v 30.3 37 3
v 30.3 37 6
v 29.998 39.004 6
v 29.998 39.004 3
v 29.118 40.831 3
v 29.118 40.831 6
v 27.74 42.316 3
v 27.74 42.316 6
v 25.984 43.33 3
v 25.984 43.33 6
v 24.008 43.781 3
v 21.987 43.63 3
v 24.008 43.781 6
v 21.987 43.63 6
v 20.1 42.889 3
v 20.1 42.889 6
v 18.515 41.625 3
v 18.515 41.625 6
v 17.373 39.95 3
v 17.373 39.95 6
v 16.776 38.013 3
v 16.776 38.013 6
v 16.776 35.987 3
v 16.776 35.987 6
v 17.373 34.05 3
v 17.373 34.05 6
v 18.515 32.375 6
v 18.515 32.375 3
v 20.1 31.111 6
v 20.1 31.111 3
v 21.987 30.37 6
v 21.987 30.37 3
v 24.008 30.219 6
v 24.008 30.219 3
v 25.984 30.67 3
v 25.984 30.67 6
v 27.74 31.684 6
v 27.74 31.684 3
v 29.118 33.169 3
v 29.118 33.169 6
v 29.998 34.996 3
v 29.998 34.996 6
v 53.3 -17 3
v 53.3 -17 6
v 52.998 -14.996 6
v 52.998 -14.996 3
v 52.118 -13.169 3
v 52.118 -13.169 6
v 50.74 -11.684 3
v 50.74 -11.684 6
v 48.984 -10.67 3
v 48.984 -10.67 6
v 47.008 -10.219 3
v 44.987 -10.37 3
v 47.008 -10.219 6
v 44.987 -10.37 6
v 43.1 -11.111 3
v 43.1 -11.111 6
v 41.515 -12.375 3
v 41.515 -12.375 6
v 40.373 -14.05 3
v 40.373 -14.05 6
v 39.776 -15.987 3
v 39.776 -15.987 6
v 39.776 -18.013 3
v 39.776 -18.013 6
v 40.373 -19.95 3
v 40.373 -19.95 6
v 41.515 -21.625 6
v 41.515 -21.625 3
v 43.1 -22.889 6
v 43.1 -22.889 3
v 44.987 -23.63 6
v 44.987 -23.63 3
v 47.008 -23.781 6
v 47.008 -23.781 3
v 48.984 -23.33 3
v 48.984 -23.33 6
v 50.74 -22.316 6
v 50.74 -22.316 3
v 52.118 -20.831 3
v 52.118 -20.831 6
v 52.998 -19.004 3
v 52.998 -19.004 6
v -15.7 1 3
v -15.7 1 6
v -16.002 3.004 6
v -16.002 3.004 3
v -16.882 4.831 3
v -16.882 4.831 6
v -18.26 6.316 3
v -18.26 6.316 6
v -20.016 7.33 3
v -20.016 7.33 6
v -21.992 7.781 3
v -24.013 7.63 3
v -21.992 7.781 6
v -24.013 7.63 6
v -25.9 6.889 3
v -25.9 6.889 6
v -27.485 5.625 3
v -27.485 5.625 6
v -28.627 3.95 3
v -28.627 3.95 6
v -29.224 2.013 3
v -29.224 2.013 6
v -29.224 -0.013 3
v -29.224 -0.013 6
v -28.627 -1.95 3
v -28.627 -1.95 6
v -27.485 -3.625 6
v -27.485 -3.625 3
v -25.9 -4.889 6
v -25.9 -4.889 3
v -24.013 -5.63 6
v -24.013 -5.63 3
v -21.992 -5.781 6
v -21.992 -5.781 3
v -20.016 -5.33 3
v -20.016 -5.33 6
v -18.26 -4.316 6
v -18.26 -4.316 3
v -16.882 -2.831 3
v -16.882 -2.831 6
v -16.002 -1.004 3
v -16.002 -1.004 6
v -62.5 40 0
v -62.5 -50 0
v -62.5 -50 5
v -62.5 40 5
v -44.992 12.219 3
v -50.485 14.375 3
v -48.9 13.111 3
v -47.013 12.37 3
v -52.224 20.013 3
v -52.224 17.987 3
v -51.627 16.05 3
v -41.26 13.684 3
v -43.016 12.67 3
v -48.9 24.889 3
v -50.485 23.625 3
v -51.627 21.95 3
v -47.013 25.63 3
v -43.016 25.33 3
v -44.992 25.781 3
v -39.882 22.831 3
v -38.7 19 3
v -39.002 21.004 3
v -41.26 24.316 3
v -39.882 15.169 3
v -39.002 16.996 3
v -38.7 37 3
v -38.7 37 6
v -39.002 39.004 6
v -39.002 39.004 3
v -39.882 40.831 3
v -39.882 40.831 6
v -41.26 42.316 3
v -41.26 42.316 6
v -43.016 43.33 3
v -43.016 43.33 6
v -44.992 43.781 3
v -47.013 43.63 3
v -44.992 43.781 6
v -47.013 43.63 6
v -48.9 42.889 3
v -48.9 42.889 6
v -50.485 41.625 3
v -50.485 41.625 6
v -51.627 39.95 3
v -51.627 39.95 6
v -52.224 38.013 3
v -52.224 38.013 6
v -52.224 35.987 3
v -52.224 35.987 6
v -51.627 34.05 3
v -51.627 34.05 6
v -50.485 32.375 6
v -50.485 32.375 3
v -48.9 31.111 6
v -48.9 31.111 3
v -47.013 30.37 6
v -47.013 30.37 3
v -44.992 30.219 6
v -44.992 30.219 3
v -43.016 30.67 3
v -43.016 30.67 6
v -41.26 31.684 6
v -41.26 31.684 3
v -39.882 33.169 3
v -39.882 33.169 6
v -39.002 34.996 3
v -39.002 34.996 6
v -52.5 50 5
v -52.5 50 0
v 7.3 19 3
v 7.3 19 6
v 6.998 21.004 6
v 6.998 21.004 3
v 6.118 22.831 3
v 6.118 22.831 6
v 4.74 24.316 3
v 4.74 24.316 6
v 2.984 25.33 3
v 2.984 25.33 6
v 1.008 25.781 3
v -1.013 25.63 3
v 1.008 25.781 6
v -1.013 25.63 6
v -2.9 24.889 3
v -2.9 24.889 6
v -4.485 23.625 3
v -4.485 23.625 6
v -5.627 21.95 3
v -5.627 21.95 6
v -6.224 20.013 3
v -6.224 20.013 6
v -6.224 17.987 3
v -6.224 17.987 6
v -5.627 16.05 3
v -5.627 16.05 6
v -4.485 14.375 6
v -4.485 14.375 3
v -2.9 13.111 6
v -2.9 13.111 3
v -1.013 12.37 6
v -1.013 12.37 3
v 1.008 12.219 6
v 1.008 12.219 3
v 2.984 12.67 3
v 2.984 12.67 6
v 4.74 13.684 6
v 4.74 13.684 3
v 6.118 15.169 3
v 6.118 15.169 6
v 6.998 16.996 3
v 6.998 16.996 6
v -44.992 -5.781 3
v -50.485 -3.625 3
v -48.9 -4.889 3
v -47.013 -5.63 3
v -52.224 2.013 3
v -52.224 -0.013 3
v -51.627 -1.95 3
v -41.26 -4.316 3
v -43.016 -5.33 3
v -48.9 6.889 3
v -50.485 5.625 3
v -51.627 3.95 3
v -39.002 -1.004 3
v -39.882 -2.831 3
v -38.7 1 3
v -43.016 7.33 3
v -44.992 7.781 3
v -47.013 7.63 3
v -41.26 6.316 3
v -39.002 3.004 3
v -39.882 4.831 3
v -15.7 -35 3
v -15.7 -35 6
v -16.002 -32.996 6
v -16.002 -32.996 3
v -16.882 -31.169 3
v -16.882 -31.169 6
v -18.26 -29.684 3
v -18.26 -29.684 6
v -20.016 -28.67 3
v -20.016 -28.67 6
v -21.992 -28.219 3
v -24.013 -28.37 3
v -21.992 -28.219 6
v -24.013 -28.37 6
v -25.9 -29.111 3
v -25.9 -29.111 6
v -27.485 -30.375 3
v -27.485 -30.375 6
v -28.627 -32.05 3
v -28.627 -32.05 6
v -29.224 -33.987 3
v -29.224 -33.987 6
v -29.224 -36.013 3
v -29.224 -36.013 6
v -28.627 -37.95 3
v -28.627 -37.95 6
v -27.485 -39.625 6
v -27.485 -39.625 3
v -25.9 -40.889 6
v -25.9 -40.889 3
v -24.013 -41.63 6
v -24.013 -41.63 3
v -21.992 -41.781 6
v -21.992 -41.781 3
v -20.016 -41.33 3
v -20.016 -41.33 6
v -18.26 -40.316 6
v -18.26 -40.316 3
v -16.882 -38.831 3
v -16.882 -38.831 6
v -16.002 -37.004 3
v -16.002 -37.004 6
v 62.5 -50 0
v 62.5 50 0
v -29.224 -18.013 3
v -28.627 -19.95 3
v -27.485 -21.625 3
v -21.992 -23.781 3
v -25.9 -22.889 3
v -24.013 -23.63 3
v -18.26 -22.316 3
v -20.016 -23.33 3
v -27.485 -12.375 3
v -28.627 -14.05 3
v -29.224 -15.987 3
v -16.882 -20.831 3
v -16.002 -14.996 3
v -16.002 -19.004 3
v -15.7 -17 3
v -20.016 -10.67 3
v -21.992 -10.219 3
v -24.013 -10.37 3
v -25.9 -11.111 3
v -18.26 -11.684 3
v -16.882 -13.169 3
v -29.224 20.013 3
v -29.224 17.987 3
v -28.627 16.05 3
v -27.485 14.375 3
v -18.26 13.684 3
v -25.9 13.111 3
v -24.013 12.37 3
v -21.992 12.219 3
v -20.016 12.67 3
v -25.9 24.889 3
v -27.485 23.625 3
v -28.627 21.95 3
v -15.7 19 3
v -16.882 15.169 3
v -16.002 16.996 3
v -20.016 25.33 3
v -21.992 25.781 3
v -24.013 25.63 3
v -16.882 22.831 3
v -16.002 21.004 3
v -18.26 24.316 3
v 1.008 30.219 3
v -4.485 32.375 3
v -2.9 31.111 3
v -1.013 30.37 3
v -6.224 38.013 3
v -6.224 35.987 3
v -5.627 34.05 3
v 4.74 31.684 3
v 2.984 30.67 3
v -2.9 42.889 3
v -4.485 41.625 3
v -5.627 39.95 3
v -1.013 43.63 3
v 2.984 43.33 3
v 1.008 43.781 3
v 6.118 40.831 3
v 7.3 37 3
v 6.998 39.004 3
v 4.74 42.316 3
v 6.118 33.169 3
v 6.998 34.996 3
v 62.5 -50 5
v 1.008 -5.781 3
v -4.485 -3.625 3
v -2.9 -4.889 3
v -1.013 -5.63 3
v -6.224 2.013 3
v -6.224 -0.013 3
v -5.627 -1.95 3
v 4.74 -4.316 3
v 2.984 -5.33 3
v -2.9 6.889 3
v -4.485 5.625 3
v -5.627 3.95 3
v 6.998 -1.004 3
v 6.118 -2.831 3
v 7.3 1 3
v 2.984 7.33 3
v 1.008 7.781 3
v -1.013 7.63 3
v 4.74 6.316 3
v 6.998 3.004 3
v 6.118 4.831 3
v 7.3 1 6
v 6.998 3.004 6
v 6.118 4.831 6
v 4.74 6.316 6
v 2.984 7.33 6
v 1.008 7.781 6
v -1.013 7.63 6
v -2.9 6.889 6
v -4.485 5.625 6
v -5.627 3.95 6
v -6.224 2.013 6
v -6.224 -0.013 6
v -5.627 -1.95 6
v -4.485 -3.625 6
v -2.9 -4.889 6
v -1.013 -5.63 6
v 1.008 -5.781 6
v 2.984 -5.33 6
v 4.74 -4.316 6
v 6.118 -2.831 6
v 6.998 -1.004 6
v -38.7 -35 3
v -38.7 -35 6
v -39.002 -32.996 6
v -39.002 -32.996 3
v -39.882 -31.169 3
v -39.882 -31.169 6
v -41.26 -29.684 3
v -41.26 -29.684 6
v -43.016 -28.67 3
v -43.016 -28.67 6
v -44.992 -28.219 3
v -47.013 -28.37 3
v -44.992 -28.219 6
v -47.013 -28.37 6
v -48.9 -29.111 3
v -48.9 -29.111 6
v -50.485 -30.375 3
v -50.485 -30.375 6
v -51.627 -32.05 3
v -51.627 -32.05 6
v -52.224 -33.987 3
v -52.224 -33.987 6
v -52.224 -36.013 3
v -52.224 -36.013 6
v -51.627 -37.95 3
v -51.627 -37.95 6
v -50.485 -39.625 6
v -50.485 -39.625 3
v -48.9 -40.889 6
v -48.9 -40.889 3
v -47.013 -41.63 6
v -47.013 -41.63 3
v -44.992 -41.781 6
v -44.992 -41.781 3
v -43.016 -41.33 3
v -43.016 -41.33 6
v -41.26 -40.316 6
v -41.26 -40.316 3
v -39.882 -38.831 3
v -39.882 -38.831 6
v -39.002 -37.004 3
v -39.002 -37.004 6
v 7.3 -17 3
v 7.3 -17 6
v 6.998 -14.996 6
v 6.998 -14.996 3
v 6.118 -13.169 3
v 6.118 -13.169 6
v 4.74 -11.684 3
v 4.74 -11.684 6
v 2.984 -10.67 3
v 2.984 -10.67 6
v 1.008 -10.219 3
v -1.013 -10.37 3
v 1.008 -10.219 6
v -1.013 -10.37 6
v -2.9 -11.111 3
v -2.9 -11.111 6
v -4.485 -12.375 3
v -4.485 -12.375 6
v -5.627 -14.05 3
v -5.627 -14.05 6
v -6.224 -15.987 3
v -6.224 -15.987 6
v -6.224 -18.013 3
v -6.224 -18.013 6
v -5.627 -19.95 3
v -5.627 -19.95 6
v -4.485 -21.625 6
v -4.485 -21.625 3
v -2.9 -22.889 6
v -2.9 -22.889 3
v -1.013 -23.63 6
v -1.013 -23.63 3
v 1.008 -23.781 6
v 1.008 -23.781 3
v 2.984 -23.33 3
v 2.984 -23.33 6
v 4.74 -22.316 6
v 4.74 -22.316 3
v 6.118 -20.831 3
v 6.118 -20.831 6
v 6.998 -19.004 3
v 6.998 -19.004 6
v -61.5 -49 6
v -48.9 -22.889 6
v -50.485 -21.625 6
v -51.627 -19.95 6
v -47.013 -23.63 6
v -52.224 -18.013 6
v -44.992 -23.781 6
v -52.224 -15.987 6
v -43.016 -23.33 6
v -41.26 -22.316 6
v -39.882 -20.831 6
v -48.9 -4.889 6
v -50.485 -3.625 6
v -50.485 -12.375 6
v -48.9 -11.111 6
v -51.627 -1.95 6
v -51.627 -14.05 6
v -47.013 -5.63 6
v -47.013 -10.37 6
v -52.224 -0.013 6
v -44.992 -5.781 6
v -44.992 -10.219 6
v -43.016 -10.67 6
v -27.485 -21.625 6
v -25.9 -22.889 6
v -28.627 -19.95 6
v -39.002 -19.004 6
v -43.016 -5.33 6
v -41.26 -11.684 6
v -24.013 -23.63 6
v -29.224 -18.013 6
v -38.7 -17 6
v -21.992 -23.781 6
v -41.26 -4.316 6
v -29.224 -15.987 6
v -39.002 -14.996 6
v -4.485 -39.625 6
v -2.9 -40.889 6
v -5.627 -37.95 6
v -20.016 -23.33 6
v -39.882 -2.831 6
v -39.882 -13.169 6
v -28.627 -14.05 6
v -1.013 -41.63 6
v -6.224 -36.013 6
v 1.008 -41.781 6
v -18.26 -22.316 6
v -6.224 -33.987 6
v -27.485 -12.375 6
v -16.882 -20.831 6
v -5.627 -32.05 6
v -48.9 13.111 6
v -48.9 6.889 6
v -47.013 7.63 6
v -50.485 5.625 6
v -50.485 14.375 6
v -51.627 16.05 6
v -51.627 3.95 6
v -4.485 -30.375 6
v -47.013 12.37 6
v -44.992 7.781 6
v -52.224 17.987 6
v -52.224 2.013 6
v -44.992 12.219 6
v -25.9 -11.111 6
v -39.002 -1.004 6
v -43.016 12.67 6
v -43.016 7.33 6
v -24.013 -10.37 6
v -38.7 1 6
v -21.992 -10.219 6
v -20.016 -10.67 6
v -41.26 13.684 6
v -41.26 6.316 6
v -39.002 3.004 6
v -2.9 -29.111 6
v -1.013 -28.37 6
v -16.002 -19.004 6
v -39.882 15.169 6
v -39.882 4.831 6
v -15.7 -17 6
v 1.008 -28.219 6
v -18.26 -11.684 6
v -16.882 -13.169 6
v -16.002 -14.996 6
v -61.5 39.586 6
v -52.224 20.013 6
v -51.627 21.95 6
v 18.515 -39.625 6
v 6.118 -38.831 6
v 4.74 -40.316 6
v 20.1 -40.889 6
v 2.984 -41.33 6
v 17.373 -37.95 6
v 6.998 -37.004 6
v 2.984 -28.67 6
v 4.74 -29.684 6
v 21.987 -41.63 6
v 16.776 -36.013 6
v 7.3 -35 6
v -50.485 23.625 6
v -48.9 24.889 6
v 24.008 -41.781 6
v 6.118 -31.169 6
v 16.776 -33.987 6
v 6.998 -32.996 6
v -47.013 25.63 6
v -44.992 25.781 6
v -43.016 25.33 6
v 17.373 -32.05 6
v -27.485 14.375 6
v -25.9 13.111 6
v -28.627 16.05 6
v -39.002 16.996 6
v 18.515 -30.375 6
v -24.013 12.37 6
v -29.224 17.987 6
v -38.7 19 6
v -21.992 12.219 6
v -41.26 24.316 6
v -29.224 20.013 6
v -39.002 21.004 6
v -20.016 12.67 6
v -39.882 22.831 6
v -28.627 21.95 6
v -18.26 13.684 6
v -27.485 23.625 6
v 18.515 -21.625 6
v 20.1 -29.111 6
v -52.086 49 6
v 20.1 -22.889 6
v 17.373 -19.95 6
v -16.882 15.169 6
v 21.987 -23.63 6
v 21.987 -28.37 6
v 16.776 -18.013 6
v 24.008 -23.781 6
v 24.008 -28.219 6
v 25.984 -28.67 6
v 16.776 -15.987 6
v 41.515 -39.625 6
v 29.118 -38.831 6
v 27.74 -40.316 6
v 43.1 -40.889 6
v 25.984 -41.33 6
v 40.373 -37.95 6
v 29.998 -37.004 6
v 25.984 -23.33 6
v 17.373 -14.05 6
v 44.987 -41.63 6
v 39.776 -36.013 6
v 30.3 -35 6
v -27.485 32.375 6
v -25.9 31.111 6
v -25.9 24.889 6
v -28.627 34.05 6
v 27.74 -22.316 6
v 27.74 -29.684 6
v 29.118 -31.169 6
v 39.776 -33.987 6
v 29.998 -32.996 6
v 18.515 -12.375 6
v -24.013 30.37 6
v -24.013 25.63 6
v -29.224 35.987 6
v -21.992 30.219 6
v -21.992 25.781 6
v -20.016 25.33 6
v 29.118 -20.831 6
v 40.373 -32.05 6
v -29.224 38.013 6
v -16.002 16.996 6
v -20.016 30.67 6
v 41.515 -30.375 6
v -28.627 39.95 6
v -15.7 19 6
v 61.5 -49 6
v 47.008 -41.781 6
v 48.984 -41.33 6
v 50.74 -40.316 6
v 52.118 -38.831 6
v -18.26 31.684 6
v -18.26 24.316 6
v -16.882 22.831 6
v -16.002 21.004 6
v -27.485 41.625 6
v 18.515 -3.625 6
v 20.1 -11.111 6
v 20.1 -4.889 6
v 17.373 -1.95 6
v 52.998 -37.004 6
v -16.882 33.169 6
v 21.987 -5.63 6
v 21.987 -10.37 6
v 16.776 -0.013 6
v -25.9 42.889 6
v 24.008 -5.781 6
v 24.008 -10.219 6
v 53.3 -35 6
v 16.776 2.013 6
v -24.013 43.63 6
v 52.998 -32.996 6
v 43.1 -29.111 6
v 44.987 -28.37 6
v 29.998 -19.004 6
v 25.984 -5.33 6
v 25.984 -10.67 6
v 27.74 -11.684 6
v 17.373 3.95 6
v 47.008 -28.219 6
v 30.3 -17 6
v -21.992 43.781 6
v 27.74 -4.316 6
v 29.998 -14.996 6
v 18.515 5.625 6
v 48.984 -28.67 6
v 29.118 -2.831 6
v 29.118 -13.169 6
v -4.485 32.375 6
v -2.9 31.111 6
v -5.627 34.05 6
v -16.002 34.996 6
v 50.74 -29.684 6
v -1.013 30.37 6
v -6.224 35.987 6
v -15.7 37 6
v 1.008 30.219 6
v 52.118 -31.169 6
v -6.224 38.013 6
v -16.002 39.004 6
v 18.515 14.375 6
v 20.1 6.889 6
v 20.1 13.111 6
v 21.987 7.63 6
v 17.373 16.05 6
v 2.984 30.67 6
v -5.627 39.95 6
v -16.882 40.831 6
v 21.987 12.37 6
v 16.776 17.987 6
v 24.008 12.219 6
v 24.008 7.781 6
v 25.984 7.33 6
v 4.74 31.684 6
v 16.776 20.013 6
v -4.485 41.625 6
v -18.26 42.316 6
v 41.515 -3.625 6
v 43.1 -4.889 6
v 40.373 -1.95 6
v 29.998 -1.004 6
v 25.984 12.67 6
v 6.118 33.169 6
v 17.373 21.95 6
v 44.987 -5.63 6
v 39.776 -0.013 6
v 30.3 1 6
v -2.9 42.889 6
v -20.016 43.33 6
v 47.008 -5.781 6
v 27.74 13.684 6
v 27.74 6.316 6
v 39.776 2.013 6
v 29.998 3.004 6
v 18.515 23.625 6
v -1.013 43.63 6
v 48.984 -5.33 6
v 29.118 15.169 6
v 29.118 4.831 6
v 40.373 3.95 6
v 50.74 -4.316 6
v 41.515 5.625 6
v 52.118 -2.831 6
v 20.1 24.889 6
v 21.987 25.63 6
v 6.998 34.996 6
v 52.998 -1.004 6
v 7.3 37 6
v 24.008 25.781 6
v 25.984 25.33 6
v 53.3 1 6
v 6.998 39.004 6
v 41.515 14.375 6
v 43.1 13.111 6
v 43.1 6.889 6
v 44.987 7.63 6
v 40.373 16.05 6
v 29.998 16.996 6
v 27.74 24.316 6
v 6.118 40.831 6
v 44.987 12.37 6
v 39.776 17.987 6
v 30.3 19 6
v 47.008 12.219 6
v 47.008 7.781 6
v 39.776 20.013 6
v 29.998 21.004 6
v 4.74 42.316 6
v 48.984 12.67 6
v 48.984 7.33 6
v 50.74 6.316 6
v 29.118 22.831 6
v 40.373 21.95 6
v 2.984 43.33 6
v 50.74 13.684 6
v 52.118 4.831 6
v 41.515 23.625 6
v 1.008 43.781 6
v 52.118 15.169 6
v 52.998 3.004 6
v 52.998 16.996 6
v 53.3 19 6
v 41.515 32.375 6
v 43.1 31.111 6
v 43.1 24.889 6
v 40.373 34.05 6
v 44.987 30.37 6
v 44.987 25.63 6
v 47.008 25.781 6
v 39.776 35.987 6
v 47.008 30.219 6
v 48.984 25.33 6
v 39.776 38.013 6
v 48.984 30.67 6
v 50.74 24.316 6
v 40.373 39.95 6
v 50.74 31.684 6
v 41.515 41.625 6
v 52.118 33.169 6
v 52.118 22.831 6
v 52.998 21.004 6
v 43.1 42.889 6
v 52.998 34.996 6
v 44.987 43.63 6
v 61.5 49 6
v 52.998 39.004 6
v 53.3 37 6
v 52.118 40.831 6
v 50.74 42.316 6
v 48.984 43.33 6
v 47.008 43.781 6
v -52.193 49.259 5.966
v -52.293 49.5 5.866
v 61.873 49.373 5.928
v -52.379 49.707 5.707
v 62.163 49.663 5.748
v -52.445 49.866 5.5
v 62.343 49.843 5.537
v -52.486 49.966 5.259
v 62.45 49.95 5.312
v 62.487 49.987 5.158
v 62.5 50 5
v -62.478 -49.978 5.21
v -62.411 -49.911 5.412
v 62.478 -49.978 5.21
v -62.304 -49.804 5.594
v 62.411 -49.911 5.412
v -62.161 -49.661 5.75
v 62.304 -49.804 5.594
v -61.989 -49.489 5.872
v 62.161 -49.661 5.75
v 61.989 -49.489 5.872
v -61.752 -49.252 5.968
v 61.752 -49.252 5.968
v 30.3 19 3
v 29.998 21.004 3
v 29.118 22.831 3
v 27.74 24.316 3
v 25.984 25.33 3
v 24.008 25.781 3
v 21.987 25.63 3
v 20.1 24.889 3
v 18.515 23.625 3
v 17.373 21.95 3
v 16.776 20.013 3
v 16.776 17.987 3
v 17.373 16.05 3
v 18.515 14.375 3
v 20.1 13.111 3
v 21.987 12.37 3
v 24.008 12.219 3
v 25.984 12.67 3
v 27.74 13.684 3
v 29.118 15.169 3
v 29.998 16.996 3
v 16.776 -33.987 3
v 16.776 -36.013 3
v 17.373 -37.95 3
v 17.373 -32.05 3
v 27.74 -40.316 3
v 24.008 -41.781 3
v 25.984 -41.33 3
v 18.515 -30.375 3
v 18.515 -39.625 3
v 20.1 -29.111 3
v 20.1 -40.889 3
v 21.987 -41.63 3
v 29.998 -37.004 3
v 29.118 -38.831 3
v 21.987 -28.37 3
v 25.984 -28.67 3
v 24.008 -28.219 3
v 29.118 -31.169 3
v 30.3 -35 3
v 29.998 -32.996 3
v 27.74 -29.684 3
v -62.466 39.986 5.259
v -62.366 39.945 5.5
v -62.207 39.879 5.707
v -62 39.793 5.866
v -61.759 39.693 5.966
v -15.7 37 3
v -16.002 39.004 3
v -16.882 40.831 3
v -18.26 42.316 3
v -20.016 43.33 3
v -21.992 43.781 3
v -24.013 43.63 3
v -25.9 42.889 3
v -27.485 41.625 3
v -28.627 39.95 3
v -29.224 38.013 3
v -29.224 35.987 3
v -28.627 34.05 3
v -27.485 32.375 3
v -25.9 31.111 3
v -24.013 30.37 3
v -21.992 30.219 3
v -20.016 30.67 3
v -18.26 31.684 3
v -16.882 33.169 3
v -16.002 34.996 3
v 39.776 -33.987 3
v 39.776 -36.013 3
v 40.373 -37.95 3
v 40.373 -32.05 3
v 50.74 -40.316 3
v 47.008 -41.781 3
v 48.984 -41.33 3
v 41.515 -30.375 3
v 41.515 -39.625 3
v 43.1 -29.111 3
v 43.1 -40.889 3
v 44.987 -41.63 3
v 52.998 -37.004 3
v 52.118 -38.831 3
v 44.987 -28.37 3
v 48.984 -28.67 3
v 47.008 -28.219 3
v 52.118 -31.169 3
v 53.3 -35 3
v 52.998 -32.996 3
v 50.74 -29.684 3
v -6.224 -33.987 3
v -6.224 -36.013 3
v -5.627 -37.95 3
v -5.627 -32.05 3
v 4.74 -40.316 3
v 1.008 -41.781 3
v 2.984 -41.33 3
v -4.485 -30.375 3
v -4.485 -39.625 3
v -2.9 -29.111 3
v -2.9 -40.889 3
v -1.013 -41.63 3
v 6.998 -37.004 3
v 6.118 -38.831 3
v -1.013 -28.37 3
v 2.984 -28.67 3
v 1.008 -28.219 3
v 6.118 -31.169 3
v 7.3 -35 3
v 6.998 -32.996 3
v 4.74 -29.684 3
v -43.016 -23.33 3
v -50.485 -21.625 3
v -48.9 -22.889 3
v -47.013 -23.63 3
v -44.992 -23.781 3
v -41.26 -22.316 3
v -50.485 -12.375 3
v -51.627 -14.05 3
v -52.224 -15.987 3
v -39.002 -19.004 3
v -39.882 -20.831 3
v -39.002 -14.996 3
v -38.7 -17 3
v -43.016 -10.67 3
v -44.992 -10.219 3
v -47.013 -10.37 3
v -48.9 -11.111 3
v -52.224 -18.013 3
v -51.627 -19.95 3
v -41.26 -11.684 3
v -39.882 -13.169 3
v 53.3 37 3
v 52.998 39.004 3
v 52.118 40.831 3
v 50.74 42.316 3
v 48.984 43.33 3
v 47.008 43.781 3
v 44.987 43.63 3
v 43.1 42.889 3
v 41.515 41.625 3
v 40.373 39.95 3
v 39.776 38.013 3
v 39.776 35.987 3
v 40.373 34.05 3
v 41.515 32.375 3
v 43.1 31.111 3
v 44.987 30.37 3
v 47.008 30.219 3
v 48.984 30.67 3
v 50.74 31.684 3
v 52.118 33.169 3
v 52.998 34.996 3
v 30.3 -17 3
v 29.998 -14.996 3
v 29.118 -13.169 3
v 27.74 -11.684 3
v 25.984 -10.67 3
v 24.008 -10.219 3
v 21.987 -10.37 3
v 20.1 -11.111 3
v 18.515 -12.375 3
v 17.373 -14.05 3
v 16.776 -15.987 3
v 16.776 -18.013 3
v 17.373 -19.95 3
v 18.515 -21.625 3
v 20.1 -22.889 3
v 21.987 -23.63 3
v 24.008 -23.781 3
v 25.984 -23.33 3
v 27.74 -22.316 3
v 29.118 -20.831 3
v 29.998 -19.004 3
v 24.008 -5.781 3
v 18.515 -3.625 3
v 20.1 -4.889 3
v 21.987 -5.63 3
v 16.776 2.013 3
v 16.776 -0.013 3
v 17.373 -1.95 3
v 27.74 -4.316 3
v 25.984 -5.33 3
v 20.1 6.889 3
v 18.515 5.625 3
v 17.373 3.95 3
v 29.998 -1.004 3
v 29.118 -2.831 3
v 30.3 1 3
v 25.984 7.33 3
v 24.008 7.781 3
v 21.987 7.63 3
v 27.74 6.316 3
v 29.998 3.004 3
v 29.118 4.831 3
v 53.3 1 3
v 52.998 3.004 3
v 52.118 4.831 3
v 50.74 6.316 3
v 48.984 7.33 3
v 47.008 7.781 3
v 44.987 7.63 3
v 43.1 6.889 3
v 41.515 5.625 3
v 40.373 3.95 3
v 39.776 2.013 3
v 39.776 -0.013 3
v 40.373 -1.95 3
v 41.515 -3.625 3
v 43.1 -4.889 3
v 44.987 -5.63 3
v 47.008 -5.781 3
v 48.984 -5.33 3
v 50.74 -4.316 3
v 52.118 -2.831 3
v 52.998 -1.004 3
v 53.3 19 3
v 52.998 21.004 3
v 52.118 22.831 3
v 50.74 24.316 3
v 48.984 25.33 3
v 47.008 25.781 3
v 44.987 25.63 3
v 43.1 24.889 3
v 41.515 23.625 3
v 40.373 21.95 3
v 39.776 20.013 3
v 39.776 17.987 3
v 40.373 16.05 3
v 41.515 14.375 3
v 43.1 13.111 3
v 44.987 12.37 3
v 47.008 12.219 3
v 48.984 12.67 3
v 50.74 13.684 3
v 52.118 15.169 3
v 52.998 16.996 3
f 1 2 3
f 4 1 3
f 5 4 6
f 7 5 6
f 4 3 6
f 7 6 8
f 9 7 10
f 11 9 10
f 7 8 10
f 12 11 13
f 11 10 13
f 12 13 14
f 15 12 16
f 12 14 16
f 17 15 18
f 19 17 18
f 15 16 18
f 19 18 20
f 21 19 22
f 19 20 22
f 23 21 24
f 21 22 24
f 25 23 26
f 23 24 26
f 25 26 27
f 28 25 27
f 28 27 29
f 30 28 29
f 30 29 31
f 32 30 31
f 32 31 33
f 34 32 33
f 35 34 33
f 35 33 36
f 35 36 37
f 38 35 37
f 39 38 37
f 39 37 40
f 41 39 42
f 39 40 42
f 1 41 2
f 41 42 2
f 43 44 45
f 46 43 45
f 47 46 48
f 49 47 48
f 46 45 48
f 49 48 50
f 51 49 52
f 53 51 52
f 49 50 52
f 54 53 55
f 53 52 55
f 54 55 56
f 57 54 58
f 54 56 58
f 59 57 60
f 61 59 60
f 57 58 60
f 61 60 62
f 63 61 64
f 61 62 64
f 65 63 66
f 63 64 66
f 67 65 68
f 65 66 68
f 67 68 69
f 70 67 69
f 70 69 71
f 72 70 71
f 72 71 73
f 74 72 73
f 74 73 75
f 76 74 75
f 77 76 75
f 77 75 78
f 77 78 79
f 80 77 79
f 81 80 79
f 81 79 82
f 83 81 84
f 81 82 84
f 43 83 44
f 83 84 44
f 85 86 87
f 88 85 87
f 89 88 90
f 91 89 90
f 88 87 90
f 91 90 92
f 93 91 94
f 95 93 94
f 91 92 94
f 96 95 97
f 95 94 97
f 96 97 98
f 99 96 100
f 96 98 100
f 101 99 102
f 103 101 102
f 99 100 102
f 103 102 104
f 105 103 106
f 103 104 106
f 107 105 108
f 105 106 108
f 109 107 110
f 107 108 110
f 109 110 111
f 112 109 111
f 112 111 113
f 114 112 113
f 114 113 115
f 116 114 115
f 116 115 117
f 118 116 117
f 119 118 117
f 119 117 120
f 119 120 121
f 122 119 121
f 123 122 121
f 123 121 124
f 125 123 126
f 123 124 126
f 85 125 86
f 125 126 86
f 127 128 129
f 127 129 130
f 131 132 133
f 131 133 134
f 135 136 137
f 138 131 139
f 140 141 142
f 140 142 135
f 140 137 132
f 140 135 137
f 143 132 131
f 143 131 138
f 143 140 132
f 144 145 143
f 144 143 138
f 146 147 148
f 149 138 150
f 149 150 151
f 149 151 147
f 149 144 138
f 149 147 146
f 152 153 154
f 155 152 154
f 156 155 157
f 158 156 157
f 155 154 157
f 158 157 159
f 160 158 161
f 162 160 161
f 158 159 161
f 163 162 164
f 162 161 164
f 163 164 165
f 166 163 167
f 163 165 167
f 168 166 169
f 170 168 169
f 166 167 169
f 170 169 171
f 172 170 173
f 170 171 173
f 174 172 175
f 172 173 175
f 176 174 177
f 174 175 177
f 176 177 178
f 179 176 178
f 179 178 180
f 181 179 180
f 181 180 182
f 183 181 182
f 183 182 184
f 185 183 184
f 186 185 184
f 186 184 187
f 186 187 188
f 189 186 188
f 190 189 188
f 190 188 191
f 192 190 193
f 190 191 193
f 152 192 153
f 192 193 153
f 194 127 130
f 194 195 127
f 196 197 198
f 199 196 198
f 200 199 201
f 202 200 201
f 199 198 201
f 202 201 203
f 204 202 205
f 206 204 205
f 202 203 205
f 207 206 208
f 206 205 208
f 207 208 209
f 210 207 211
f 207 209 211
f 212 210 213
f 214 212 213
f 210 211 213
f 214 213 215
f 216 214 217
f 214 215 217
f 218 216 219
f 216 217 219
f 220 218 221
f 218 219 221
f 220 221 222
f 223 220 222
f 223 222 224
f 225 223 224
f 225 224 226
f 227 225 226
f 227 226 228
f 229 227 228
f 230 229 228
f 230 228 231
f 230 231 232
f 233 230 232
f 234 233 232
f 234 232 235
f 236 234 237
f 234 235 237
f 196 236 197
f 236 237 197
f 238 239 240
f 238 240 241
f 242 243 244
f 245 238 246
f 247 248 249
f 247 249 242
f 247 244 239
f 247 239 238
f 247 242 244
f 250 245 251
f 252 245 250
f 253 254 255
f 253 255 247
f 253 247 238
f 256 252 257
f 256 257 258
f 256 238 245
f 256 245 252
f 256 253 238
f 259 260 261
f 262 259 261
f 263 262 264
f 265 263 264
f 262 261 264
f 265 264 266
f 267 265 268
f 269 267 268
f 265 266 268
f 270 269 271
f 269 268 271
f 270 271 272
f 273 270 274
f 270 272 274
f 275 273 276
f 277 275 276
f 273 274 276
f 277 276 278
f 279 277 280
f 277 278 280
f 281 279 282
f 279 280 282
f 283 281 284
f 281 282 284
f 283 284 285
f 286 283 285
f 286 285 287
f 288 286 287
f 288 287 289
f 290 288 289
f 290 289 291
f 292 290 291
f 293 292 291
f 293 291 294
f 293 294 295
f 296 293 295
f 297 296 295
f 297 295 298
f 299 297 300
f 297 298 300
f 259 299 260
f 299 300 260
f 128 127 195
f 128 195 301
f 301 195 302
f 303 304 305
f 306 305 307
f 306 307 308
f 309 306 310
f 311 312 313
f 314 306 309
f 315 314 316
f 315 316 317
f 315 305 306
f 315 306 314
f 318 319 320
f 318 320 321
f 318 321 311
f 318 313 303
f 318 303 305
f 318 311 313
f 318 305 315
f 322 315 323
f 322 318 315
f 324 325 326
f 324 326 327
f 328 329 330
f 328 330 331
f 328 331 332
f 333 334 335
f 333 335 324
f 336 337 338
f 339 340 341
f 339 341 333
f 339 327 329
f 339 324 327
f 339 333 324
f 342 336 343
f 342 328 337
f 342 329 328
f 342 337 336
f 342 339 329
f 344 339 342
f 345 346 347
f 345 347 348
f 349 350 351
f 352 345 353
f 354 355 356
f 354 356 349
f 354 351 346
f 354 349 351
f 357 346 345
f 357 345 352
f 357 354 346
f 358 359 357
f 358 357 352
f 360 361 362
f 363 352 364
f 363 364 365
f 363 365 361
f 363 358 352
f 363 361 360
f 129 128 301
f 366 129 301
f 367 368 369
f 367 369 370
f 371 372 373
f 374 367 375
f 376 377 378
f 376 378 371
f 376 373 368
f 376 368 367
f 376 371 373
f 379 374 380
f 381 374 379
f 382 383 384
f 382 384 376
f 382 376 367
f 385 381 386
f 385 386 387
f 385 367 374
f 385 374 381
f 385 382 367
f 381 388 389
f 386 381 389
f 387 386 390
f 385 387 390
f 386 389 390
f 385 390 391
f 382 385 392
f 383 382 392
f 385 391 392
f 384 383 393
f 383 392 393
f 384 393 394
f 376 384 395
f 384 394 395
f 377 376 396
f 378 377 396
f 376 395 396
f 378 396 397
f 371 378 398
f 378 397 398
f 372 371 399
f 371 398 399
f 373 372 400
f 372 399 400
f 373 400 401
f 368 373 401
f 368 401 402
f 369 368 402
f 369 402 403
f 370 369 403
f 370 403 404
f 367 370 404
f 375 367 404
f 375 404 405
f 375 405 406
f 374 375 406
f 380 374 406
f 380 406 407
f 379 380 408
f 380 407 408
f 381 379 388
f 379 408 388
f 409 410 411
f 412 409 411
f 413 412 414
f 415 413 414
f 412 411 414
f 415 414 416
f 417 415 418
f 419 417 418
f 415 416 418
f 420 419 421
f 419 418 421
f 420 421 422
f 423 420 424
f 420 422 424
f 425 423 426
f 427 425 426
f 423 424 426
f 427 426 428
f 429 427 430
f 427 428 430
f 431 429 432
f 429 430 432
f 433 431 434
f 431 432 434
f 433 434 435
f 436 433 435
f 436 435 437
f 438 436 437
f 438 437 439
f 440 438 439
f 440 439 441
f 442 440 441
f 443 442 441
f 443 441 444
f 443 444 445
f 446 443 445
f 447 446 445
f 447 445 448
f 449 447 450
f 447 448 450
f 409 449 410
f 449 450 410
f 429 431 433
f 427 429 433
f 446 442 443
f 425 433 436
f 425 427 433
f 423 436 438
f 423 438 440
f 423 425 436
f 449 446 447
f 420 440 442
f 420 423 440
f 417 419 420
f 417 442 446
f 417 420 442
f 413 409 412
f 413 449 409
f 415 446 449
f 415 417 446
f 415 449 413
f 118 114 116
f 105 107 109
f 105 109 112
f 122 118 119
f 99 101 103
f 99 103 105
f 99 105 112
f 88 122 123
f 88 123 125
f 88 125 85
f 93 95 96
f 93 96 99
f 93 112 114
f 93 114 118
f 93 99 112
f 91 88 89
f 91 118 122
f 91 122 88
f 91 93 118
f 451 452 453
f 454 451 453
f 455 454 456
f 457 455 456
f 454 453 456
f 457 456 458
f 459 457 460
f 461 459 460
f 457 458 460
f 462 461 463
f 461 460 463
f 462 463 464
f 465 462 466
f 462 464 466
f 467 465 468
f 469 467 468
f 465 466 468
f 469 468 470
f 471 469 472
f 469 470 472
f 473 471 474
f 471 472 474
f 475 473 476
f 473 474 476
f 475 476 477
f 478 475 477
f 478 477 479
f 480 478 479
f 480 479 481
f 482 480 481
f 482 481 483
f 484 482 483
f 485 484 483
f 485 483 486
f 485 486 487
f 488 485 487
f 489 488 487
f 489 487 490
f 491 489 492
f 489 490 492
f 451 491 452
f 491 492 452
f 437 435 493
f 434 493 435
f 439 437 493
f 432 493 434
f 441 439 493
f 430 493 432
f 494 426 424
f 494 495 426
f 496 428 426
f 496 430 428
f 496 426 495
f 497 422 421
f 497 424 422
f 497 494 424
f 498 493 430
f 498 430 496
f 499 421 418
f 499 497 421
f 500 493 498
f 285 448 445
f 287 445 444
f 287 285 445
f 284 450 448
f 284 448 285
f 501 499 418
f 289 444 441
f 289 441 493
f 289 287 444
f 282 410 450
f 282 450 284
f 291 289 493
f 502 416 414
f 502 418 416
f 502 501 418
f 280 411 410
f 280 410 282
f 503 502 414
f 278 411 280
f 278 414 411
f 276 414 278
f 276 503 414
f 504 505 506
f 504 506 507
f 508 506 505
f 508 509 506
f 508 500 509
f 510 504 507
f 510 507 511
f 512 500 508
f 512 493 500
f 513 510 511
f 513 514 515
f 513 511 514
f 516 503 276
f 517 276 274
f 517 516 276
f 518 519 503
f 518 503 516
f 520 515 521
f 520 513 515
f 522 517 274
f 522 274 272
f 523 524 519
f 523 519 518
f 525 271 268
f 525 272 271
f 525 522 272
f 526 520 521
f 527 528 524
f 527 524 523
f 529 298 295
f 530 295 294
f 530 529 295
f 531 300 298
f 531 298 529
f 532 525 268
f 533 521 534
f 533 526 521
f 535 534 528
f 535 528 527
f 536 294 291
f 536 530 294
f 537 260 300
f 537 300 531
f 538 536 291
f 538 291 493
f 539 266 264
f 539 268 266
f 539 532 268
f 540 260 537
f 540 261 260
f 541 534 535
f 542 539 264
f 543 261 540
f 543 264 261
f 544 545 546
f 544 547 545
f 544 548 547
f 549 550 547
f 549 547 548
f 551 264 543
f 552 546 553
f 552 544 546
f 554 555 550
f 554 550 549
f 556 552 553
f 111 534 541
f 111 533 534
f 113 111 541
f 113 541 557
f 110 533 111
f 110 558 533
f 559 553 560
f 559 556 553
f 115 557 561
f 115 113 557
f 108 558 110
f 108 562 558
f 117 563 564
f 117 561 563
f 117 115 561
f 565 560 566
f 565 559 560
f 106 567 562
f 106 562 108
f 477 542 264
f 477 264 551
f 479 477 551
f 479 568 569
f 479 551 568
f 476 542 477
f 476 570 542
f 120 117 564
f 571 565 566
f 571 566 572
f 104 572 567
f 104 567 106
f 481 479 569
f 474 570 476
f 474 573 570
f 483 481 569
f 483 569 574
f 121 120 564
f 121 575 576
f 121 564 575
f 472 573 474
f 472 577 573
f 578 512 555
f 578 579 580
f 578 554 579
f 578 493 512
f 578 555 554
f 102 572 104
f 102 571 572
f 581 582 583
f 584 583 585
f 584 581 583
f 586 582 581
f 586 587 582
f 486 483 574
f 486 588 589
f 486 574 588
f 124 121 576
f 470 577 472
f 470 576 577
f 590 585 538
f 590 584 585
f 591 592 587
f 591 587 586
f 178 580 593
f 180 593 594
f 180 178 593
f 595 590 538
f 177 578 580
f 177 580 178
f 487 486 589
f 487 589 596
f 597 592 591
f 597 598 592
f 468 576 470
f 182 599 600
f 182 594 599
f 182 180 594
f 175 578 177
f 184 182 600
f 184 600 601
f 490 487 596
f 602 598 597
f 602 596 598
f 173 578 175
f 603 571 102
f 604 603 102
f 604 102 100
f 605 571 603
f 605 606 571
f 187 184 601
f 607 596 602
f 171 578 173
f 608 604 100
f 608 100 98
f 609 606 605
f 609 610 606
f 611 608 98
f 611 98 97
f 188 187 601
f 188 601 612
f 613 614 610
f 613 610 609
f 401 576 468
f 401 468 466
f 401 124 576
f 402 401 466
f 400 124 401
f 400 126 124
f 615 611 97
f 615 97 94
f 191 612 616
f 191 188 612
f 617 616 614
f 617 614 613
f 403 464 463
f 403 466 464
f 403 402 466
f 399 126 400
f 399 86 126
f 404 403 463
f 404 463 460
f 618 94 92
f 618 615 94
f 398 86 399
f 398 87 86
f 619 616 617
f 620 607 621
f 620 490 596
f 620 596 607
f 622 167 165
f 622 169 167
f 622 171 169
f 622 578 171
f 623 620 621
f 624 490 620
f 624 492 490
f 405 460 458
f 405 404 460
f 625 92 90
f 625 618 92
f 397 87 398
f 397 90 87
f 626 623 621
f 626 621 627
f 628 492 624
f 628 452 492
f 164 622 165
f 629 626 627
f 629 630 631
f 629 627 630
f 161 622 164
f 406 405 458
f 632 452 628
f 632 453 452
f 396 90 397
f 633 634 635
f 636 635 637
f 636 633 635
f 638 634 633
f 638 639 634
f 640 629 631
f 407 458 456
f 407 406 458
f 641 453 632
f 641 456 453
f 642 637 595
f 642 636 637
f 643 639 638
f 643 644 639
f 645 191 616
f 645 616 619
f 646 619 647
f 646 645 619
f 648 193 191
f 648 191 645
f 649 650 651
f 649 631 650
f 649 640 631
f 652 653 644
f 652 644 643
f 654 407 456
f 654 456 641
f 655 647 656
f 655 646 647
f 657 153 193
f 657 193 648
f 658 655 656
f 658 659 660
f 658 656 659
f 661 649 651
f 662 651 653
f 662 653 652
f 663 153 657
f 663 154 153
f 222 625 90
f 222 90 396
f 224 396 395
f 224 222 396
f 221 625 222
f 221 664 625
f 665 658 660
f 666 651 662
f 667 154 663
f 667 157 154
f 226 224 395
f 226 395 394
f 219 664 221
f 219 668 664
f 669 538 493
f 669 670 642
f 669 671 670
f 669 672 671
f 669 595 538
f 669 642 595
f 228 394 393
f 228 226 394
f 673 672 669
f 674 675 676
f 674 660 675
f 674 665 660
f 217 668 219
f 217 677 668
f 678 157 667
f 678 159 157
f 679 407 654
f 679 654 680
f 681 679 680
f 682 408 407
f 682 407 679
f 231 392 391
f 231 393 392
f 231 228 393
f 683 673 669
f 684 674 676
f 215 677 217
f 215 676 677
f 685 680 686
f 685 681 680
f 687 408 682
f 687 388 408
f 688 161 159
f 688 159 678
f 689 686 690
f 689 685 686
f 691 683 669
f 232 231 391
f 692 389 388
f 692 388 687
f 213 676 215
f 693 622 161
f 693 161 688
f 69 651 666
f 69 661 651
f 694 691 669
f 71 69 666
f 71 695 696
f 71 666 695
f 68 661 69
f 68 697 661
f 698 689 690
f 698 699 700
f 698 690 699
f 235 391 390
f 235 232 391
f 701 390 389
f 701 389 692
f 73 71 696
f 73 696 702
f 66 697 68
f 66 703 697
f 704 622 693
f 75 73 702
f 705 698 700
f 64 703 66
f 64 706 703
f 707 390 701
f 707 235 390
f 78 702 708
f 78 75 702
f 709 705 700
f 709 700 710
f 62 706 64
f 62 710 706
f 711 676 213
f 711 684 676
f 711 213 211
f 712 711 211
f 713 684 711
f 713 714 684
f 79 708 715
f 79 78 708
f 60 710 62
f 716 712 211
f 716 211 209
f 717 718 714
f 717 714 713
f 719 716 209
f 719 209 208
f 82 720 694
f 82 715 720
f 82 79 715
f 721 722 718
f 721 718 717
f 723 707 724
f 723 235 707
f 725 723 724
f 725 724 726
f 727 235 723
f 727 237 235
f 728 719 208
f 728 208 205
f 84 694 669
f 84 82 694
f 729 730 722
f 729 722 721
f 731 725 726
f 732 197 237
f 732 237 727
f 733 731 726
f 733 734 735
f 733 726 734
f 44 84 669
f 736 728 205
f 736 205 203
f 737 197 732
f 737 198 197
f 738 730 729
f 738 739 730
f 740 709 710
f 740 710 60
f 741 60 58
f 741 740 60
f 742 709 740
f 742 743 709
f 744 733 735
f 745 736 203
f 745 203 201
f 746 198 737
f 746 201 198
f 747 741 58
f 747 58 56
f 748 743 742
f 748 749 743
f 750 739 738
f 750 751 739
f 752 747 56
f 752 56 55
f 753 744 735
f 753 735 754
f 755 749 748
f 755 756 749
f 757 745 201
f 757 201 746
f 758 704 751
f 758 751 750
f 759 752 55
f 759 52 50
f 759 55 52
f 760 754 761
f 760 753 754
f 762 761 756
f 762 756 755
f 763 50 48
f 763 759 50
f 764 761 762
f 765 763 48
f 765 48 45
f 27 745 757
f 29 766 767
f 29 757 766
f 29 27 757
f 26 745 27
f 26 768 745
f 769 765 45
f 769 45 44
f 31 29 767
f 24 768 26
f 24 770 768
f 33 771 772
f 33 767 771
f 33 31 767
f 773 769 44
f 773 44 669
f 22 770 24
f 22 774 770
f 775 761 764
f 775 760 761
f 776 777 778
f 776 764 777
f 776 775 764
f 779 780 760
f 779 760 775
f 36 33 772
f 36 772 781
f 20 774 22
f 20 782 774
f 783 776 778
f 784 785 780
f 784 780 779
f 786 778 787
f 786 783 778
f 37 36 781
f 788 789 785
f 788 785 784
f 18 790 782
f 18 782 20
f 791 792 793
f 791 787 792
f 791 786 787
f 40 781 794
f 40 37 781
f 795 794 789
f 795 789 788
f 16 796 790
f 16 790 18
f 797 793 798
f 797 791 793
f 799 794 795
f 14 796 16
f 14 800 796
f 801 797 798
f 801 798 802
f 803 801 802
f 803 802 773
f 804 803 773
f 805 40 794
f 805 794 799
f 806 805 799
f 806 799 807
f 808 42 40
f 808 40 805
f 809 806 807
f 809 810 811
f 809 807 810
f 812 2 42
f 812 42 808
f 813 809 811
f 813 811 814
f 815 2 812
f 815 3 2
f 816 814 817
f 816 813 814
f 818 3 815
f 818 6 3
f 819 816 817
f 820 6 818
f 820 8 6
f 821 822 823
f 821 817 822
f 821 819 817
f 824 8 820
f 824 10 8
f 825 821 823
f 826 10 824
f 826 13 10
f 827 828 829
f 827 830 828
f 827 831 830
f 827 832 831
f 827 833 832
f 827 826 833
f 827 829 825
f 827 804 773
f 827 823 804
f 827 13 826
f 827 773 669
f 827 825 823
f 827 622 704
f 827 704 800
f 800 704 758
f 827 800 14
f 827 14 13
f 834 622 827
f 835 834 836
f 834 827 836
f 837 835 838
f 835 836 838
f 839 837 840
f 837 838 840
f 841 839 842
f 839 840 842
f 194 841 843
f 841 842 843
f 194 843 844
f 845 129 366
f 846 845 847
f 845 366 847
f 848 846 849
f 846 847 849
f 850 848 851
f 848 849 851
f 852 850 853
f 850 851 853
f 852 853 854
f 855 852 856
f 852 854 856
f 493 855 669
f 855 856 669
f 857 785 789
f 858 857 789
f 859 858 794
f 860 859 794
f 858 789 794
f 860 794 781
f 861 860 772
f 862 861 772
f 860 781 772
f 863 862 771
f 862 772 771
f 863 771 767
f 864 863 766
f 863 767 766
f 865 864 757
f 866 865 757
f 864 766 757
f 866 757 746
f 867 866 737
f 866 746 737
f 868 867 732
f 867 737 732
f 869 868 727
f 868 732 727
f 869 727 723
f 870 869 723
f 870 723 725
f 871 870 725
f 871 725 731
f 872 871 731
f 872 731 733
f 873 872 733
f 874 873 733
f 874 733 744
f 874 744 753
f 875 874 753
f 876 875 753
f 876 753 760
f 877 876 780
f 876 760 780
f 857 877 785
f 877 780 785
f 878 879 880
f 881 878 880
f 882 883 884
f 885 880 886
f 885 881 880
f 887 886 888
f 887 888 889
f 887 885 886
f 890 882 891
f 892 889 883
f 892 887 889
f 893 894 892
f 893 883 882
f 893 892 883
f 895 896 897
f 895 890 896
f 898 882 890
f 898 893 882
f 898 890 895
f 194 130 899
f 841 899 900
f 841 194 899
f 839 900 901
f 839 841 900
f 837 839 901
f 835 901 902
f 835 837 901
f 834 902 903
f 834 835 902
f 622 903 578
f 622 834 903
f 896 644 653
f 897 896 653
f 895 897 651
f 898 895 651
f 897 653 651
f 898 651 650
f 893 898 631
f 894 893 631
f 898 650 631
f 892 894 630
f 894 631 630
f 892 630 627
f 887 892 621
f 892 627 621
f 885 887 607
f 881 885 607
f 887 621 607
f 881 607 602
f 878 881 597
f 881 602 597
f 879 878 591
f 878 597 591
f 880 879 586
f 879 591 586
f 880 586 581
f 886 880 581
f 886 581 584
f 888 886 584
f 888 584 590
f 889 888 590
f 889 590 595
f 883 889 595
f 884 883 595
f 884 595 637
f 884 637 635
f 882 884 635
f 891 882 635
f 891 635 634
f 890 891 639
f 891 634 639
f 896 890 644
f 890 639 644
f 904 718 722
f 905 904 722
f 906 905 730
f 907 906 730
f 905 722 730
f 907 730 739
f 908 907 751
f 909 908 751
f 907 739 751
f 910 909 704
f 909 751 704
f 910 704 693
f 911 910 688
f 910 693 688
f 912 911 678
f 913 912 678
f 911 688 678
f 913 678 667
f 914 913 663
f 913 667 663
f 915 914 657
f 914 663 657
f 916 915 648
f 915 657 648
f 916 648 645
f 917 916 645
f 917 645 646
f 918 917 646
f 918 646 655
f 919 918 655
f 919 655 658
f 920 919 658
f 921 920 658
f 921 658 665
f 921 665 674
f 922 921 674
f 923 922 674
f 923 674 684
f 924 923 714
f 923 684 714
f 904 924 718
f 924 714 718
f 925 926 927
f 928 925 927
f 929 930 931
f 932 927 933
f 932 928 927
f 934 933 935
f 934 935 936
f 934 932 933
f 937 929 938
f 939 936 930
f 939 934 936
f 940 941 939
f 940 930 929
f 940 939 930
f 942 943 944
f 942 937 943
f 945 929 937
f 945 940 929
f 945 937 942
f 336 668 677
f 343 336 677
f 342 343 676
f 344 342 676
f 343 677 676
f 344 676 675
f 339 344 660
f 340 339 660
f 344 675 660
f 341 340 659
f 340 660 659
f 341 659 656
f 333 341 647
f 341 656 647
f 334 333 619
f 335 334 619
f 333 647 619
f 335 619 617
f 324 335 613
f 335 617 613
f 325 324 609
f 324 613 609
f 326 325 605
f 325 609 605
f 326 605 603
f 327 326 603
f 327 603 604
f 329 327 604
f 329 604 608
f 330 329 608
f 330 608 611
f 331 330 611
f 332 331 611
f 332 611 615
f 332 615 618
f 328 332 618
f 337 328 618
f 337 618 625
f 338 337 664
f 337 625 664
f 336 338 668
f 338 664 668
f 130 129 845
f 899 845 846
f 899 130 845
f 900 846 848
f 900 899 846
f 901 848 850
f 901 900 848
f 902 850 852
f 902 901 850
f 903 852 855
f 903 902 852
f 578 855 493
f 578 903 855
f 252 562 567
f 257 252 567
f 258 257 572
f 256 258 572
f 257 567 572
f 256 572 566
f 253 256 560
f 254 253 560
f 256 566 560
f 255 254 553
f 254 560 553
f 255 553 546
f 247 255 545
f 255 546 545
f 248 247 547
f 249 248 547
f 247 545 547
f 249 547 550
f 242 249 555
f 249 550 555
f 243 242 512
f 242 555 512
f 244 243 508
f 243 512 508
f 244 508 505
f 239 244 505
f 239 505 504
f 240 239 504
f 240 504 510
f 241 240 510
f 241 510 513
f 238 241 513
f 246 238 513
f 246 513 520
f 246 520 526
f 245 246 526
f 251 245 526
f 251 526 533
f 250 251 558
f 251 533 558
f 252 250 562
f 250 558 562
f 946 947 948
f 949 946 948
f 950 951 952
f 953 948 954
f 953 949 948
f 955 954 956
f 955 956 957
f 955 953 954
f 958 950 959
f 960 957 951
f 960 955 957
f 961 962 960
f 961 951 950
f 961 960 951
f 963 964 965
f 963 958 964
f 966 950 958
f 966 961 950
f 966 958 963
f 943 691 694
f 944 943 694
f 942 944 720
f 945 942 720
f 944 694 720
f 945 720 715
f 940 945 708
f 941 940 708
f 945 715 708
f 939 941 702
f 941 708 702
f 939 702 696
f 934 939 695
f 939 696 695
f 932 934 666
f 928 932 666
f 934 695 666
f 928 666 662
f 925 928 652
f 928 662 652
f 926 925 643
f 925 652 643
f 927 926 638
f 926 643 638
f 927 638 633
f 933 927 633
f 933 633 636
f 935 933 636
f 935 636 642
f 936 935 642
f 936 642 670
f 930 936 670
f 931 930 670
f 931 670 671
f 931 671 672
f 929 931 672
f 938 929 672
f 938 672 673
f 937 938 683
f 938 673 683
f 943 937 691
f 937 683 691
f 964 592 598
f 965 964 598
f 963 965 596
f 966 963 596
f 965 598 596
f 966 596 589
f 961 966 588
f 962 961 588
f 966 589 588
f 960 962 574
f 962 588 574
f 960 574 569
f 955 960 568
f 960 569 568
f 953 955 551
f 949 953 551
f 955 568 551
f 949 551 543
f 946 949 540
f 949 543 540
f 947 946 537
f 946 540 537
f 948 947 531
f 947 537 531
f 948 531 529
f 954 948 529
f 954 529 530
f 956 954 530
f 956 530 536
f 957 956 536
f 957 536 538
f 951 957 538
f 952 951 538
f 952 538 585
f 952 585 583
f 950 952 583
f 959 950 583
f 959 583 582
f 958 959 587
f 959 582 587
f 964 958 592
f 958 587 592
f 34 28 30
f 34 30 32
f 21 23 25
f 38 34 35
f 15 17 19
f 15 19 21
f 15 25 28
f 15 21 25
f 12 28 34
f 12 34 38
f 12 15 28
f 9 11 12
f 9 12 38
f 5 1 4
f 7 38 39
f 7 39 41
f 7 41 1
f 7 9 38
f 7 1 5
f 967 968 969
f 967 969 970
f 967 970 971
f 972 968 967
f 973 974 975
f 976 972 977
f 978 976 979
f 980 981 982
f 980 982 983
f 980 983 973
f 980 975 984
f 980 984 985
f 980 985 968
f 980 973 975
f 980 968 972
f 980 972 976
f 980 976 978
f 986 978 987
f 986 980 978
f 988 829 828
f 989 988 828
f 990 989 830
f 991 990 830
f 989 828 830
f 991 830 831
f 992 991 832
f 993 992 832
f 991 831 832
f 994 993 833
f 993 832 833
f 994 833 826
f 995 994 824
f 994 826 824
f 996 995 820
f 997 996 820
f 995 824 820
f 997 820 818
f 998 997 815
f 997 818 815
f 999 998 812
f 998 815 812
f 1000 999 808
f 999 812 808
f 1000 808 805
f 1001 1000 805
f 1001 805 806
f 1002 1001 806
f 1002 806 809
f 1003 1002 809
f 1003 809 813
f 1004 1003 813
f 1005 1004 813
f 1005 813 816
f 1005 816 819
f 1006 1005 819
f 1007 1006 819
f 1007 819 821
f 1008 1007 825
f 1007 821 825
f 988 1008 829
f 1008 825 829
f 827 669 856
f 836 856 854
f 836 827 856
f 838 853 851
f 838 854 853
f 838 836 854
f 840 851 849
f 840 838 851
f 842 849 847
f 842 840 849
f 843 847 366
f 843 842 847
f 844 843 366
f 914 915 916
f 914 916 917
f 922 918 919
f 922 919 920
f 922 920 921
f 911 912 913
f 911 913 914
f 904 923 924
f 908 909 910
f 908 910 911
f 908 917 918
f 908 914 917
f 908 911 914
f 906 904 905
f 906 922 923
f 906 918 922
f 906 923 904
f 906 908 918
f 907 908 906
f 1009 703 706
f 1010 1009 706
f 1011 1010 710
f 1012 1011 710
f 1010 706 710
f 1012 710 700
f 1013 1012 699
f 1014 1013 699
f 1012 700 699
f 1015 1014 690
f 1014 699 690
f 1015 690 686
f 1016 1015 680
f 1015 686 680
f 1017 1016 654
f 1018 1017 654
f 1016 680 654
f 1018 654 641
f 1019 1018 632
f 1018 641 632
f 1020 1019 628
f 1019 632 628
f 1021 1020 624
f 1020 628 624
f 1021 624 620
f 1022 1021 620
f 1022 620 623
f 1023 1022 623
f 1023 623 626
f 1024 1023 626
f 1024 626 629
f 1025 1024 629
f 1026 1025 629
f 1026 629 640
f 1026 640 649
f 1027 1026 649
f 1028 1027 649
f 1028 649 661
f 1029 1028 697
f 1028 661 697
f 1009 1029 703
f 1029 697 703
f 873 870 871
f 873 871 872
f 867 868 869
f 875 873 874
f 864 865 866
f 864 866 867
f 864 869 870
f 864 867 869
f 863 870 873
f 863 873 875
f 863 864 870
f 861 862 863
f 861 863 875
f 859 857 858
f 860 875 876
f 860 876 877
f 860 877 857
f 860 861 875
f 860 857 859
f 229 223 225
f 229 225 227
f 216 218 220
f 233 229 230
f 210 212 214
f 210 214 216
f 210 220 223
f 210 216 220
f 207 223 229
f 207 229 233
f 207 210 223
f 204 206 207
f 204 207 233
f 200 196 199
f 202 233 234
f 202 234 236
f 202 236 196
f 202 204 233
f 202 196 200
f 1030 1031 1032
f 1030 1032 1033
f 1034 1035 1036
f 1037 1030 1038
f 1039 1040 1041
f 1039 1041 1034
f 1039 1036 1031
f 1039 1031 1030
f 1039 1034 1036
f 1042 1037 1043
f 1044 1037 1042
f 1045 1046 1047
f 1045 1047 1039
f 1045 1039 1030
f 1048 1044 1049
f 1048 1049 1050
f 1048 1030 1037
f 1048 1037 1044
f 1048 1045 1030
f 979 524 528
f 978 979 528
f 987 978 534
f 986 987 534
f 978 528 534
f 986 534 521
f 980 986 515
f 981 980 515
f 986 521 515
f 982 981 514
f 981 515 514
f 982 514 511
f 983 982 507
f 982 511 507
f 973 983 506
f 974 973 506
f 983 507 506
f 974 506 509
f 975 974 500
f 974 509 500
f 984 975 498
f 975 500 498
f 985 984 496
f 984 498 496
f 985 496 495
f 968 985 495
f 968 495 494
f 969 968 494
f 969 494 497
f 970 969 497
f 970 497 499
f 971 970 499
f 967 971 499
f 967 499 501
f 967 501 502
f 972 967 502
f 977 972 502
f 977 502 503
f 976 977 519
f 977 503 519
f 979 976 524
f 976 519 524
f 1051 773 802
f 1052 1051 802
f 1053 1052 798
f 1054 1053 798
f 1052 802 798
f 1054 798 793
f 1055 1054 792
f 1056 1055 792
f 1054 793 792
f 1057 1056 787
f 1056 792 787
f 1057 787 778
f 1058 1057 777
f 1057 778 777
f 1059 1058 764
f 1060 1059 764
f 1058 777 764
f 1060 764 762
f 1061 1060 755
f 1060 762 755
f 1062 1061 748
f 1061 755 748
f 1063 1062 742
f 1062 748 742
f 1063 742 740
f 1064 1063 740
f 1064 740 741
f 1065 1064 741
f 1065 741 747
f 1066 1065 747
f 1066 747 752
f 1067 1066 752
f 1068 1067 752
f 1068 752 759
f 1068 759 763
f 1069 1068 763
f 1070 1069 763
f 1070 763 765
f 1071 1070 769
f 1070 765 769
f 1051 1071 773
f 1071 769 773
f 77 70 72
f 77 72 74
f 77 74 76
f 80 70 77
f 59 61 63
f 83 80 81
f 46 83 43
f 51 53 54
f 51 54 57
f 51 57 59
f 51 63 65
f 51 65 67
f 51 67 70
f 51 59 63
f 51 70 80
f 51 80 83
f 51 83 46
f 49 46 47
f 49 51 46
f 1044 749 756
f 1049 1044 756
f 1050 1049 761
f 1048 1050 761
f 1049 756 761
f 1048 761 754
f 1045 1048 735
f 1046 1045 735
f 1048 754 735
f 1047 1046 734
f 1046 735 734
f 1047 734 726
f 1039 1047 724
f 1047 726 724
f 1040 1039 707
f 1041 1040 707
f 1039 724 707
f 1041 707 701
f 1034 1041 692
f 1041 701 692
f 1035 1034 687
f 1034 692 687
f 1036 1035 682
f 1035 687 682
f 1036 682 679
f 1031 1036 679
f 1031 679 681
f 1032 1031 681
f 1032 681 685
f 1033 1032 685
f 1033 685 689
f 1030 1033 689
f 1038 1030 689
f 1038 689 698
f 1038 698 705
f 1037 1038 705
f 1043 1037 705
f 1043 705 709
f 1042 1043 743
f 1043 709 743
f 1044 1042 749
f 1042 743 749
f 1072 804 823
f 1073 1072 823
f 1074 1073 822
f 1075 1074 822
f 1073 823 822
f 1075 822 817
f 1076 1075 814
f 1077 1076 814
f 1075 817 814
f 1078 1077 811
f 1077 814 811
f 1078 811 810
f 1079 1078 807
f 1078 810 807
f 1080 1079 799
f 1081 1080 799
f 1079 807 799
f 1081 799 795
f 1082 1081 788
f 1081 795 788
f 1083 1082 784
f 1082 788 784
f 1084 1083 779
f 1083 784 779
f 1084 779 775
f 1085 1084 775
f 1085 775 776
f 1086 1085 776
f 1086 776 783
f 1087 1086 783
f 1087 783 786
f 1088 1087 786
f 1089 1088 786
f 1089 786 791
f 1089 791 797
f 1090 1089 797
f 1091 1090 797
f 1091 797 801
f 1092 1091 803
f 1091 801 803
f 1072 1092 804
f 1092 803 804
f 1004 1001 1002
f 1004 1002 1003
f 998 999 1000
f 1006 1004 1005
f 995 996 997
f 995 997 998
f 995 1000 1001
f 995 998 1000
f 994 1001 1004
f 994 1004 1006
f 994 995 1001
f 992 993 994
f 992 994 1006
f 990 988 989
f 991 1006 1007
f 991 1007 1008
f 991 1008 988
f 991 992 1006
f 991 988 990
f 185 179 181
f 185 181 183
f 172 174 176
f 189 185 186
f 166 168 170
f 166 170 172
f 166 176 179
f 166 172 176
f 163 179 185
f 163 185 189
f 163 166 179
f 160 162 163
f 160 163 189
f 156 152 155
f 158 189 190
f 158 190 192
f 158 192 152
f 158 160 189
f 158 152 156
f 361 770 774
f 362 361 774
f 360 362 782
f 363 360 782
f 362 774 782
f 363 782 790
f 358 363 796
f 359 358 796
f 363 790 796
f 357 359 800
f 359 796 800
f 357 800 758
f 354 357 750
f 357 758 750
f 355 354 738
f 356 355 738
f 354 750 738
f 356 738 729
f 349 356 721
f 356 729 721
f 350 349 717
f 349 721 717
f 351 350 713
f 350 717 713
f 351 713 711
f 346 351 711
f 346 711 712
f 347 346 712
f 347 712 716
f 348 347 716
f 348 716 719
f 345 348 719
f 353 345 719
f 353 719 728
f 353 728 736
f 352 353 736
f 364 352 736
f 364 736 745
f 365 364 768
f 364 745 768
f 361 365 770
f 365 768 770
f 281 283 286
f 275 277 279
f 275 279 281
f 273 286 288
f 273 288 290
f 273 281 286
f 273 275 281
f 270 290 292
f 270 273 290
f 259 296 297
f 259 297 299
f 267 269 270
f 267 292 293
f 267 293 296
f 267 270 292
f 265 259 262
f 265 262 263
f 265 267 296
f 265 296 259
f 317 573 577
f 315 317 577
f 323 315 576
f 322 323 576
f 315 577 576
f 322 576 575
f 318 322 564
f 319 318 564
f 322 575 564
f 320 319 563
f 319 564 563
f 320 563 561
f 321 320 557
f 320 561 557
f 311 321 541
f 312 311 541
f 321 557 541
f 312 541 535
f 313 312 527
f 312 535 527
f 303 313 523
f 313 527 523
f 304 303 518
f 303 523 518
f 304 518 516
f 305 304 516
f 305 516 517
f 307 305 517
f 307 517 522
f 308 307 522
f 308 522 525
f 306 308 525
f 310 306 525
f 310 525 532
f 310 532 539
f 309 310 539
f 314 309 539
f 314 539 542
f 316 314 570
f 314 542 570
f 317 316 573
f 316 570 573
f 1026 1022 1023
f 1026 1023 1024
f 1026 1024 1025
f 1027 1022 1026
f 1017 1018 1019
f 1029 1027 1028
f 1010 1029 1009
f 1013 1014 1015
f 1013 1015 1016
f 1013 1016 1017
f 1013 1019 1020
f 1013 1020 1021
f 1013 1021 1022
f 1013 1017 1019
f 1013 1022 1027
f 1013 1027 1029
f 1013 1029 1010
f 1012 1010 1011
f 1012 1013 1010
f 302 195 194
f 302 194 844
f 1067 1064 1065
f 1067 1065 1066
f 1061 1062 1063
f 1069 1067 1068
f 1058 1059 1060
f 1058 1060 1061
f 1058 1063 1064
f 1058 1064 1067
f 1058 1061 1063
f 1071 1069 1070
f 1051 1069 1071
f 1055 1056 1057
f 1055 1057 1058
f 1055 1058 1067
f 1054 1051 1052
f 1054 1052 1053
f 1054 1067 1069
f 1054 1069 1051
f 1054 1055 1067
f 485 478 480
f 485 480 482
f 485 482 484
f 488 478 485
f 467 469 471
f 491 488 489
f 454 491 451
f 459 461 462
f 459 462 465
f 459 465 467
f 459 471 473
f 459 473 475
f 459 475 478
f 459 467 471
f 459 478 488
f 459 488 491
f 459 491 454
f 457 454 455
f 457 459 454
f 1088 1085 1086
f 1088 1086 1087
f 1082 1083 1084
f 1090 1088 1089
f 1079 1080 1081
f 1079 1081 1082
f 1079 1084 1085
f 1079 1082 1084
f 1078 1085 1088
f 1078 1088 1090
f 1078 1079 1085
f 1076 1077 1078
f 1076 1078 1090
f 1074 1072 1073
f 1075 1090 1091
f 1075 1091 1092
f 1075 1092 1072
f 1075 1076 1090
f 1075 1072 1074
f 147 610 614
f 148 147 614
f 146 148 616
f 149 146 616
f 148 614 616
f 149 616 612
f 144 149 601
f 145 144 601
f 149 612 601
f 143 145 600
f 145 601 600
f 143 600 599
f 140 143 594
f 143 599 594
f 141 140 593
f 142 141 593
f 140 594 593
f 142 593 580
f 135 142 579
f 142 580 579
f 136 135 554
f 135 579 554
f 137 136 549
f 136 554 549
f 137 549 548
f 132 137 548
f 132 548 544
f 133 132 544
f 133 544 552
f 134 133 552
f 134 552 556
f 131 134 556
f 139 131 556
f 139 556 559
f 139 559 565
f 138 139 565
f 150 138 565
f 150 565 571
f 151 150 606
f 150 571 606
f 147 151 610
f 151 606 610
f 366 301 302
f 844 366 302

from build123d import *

# Parameters (mm, degrees)
F0_W     = 125
F0_H     = 100
F1_DEPTH = 6
F2_SIZE  = 10
F3_R     = 1
F4_R     = 6.8
F5_DEPTH = 3


with BuildPart() as f1:
    # F0 (on Top) → F1 (new body)
    with BuildSketch(Plane.XY):
        Rectangle(F0_W, F0_H)
    extrude(amount=F1_DEPTH)

    # F2
    f2_edges = [f1.edges().sort_by_distance(p)[0] for p in [
        (-62.5, 50, 3),
    ]]
    chamfer(f2_edges, length=F2_SIZE)

    # F3
    f3_edges = [f1.edges().sort_by_distance(p)[0] for p in [
        (-62.5, -5, 6),
        (0, -50, 6),
        (62.5, 0, 6),
        (5, 50, 6),
        (-57.5, 45, 6),
    ]]
    fillet(f3_edges, radius=F3_R)

    # F4 (on face) → F5 (cut)
    with BuildSketch(Plane.XY.offset(6)):
        with Locations((46.5, 37)):
            Circle(F4_R)
        with Locations((46.5, 19)):
            Circle(F4_R)
        with Locations((23.5, 37)):
            Circle(F4_R)
        with Locations((23.5, 19)):
            Circle(F4_R)
        with Locations((0.5, 37)):
            Circle(F4_R)
        with Locations((0.5, 19)):
            Circle(F4_R)
        with Locations((46.5, 1)):
            Circle(F4_R)
        with Locations((46.5, -17)):
            Circle(F4_R)
        with Locations((23.5, 1)):
            Circle(F4_R)
        with Locations((23.5, -17)):
            Circle(F4_R)
        with Locations((0.5, 1)):
            Circle(F4_R)
        with Locations((0.5, -17)):
            Circle(F4_R)
        with Locations((-22.5, 37)):
            Circle(F4_R)
        with Locations((-22.5, 19)):
            Circle(F4_R)
        with Locations((-22.5, 1)):
            Circle(F4_R)
        with Locations((-22.5, -17)):
            Circle(F4_R)
        with Locations((-45.5, 37)):
            Circle(F4_R)
        with Locations((-45.5, 19)):
            Circle(F4_R)
        with Locations((-45.5, 1)):
            Circle(F4_R)
        with Locations((-45.5, -17)):
            Circle(F4_R)
        with Locations((46.5, -35)):
            Circle(F4_R)
        with Locations((23.5, -35)):
            Circle(F4_R)
        with Locations((0.5, -35)):
            Circle(F4_R)
        with Locations((-22.5, -35)):
            Circle(F4_R)
        with Locations((-45.5, -35)):
            Circle(F4_R)
    extrude(amount=-F5_DEPTH, mode=Mode.SUBTRACT)


solid = f1.part
